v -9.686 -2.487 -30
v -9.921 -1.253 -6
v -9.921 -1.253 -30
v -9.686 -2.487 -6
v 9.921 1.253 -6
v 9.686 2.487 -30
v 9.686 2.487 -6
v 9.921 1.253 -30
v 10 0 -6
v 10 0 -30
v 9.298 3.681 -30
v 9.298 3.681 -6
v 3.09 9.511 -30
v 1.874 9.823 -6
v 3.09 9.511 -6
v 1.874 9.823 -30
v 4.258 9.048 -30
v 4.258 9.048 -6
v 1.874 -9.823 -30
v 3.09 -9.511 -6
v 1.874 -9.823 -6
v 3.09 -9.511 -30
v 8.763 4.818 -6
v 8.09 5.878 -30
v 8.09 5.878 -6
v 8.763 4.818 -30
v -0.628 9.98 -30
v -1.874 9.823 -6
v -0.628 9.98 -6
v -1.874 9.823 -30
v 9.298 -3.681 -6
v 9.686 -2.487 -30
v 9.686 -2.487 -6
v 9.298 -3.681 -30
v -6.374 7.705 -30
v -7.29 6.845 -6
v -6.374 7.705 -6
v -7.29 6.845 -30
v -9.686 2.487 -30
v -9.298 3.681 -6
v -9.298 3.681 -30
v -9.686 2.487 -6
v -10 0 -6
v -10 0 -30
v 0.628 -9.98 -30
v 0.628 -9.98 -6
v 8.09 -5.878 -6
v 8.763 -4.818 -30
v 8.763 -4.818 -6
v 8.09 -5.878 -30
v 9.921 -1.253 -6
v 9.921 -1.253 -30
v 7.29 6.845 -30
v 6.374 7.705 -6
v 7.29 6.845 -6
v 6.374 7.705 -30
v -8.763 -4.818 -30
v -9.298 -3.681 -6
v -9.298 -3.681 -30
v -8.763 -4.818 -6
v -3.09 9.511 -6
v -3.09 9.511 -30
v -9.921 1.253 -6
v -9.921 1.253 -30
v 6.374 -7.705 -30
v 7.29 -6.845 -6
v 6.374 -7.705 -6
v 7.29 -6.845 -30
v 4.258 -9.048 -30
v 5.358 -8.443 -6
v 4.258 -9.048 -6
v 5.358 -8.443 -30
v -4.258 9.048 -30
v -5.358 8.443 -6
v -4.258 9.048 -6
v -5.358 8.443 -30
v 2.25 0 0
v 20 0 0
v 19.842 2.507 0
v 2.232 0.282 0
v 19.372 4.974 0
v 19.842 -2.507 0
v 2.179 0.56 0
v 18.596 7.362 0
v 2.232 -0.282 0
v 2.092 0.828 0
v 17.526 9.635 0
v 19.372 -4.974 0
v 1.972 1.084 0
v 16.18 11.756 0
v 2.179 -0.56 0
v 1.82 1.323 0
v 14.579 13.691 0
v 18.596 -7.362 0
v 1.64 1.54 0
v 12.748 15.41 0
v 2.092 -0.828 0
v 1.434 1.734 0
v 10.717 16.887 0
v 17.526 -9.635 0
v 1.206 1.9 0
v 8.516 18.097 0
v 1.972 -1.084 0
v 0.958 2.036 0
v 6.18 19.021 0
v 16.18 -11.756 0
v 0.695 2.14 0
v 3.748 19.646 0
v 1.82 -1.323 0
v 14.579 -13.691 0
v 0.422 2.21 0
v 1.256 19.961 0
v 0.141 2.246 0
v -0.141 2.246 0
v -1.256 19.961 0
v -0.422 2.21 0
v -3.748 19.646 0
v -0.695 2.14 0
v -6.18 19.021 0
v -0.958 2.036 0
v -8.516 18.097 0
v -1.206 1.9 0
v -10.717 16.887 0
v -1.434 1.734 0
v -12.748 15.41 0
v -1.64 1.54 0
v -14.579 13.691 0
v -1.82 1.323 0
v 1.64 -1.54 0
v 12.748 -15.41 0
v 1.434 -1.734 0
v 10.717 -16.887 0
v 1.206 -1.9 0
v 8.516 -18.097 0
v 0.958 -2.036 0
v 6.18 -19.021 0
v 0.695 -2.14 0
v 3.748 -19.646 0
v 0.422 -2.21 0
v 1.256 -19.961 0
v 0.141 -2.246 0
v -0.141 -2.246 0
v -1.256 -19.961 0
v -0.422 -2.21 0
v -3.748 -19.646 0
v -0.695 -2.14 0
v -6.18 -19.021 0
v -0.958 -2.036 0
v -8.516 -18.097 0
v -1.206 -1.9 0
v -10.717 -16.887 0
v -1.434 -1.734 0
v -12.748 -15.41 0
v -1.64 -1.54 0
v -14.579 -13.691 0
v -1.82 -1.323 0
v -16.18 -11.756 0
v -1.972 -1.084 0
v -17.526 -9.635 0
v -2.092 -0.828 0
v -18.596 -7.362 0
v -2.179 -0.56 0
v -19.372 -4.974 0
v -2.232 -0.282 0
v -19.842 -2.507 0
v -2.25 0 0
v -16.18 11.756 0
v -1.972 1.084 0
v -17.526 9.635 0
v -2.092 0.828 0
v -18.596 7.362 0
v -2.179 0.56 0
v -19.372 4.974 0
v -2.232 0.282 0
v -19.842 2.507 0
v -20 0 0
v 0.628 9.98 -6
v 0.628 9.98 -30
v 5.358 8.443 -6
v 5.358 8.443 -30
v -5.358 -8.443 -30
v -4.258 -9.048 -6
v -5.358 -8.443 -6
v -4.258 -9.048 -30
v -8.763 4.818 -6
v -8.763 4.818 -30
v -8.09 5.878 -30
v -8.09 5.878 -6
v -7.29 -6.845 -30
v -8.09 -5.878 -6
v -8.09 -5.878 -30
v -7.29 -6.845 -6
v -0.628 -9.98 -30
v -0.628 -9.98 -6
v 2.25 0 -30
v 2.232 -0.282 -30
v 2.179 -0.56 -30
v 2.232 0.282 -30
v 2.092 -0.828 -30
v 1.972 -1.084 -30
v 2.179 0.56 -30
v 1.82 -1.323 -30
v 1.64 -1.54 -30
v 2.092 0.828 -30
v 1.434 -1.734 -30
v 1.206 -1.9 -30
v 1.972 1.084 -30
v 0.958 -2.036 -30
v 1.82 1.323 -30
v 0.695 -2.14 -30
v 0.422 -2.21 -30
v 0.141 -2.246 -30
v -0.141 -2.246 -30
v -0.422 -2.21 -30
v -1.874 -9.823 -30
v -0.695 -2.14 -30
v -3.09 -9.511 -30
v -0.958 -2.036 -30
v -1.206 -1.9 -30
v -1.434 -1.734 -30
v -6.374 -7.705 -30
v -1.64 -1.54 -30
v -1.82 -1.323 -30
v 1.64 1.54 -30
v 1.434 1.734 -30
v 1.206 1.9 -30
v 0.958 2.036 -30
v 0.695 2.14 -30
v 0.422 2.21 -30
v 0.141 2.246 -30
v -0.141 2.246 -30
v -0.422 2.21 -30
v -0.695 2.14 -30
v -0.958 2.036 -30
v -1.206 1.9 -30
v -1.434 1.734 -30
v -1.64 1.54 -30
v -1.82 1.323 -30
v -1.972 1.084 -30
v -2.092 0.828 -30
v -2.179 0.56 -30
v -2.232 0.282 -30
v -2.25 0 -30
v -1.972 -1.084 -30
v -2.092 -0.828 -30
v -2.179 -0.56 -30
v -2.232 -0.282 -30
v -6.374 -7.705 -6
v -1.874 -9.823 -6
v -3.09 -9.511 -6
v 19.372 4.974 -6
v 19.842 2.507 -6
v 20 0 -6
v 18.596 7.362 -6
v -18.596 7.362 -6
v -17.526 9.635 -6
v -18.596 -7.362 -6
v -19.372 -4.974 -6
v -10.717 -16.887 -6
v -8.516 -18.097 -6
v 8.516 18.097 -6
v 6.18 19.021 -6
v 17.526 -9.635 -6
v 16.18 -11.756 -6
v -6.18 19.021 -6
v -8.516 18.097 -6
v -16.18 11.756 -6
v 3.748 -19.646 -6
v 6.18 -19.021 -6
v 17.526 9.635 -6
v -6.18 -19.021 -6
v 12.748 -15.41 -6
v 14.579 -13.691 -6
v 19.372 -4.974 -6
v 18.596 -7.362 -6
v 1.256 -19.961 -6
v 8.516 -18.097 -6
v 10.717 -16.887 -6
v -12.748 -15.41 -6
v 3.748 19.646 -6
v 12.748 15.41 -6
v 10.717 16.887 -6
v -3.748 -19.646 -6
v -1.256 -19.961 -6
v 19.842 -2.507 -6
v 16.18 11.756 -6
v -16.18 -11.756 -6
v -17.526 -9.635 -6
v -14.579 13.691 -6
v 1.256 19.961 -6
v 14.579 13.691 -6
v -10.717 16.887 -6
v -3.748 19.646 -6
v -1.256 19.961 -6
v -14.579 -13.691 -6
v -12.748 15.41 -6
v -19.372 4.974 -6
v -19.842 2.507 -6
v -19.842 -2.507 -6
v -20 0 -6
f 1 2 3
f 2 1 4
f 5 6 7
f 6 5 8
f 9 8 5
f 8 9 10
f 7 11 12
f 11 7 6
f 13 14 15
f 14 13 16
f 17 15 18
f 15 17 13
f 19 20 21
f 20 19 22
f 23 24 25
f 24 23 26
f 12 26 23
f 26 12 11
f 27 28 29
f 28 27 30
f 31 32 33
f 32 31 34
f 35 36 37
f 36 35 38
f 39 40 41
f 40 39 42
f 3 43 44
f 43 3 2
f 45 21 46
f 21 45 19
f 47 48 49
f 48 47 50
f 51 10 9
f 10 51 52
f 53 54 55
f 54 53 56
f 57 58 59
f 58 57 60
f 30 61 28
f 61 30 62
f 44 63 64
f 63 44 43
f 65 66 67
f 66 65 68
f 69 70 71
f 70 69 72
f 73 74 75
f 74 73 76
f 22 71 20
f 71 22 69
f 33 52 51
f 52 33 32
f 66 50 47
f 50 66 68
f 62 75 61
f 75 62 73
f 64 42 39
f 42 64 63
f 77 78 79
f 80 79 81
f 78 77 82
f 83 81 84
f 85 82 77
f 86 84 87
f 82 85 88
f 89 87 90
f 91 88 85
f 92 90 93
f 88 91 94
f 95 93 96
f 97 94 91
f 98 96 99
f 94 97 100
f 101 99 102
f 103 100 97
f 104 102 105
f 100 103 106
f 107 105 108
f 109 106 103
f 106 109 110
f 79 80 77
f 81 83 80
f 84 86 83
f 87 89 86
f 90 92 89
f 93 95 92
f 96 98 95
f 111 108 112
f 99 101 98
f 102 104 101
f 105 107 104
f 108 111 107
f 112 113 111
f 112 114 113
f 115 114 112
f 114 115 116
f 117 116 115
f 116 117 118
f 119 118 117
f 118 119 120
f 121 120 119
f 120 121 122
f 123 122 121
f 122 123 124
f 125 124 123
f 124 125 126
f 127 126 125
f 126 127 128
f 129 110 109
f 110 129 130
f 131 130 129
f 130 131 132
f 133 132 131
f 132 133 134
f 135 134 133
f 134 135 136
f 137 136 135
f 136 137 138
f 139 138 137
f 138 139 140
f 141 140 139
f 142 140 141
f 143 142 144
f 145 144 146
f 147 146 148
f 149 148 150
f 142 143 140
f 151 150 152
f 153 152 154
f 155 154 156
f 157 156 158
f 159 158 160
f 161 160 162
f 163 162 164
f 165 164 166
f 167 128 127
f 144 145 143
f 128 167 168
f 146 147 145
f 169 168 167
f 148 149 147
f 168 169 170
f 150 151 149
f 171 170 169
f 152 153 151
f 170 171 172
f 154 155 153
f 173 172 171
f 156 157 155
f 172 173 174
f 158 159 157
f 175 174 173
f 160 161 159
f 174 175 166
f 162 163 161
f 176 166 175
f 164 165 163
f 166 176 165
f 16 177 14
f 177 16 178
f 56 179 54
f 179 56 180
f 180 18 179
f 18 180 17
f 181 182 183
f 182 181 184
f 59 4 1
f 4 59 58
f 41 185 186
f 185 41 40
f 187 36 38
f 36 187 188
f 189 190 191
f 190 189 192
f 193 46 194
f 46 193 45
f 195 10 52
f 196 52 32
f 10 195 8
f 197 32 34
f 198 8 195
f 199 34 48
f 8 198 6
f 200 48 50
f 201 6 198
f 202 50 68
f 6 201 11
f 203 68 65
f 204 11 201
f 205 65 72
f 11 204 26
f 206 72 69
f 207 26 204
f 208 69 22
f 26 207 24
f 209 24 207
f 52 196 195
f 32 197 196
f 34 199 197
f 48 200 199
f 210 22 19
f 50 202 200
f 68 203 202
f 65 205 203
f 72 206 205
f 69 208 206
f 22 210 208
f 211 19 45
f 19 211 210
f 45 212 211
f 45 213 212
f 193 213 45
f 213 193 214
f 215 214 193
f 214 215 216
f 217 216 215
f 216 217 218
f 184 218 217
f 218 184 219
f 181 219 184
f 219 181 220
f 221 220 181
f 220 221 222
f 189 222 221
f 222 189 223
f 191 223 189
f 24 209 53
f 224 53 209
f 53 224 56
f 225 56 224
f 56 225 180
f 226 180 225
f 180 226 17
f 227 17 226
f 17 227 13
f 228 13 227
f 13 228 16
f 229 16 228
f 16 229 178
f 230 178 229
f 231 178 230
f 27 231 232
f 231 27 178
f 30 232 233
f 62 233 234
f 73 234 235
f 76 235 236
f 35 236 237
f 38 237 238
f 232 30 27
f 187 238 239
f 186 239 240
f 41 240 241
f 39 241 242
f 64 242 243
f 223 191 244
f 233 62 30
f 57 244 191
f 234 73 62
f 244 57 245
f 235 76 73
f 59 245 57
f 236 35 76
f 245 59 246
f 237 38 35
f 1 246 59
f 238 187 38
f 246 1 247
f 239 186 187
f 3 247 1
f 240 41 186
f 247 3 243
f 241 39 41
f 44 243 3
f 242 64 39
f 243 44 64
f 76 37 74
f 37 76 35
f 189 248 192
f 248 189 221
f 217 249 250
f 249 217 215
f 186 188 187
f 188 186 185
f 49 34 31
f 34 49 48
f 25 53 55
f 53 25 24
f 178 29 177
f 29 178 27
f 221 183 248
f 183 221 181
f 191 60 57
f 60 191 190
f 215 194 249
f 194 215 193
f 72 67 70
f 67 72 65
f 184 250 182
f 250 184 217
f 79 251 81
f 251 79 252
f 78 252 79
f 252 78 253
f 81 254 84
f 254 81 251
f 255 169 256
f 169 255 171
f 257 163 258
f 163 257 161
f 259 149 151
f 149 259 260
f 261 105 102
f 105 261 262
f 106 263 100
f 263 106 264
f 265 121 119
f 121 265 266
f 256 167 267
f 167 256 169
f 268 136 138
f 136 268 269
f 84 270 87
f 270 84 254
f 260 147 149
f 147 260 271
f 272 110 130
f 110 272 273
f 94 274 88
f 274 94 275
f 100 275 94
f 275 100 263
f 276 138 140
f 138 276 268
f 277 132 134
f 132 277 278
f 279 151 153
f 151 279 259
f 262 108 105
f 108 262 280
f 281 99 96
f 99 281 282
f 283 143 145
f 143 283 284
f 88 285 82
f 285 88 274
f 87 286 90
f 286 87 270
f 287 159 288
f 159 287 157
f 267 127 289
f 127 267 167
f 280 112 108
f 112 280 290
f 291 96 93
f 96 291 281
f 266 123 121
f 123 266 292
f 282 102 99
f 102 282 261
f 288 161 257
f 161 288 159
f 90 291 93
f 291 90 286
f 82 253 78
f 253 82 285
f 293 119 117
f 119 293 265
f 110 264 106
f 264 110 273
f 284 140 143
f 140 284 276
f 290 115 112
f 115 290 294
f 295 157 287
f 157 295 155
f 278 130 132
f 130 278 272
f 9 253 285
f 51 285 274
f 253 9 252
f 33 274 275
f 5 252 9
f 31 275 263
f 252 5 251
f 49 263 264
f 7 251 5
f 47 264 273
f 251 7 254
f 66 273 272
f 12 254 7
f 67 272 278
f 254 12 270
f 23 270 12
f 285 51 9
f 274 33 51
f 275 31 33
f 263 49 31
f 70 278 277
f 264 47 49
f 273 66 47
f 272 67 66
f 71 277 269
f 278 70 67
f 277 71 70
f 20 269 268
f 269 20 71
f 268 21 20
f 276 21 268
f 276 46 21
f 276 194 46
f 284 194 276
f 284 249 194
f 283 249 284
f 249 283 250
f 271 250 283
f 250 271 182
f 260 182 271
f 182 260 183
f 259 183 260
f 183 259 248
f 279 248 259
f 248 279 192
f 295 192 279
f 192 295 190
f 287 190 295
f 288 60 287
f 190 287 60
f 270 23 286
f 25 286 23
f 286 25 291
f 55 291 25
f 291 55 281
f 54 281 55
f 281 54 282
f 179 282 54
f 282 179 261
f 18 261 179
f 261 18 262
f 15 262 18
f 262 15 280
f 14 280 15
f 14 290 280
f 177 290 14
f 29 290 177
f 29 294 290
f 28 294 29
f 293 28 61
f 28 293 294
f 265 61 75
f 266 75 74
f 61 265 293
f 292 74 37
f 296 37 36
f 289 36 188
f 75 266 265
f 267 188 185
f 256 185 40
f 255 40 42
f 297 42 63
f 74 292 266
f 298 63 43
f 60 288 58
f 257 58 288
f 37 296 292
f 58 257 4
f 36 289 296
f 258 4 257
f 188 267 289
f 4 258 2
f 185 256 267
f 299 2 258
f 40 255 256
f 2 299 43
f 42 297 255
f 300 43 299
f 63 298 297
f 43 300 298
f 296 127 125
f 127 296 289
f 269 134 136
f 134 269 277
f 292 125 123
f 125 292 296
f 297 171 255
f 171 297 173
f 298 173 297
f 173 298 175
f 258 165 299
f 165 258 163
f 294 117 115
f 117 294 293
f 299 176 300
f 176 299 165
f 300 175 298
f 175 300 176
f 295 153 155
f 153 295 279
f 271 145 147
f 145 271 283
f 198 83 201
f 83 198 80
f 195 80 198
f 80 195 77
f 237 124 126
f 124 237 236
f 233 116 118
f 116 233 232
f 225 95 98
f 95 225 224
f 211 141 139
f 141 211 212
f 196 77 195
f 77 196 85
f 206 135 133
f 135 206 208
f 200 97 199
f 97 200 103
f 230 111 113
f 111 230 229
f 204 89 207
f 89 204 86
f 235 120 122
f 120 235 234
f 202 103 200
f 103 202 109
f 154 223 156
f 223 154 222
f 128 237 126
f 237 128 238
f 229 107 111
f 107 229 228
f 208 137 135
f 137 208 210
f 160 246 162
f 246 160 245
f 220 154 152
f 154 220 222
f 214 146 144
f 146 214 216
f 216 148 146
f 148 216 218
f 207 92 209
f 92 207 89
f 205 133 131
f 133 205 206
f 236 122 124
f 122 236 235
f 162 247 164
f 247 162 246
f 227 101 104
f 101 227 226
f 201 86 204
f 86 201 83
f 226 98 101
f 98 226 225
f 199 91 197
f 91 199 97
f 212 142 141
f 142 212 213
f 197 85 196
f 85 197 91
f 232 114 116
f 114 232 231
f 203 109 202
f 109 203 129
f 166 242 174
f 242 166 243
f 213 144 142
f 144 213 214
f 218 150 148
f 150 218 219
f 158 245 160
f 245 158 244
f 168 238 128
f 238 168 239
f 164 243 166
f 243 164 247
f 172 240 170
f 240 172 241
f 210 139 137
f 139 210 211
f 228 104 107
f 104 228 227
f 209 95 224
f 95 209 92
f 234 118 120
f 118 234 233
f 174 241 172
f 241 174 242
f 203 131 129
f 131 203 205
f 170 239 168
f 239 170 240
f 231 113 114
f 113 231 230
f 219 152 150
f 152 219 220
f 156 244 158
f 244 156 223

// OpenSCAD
$fn = 50;


difference() {
	union() {
		translate(v = [0, 0, -30.0000000000]) {
			cylinder(h = 30, r = 10.0000000000);
		}
		translate(v = [0, 0, -6.0000000000]) {
			cylinder(h = 6, r = 20.0000000000);
		}
	}
	union() {
		#translate(v = [0, 0, -30]) {
			cylinder(h = 30, r = 2.2500000000);
		}
	}
}
